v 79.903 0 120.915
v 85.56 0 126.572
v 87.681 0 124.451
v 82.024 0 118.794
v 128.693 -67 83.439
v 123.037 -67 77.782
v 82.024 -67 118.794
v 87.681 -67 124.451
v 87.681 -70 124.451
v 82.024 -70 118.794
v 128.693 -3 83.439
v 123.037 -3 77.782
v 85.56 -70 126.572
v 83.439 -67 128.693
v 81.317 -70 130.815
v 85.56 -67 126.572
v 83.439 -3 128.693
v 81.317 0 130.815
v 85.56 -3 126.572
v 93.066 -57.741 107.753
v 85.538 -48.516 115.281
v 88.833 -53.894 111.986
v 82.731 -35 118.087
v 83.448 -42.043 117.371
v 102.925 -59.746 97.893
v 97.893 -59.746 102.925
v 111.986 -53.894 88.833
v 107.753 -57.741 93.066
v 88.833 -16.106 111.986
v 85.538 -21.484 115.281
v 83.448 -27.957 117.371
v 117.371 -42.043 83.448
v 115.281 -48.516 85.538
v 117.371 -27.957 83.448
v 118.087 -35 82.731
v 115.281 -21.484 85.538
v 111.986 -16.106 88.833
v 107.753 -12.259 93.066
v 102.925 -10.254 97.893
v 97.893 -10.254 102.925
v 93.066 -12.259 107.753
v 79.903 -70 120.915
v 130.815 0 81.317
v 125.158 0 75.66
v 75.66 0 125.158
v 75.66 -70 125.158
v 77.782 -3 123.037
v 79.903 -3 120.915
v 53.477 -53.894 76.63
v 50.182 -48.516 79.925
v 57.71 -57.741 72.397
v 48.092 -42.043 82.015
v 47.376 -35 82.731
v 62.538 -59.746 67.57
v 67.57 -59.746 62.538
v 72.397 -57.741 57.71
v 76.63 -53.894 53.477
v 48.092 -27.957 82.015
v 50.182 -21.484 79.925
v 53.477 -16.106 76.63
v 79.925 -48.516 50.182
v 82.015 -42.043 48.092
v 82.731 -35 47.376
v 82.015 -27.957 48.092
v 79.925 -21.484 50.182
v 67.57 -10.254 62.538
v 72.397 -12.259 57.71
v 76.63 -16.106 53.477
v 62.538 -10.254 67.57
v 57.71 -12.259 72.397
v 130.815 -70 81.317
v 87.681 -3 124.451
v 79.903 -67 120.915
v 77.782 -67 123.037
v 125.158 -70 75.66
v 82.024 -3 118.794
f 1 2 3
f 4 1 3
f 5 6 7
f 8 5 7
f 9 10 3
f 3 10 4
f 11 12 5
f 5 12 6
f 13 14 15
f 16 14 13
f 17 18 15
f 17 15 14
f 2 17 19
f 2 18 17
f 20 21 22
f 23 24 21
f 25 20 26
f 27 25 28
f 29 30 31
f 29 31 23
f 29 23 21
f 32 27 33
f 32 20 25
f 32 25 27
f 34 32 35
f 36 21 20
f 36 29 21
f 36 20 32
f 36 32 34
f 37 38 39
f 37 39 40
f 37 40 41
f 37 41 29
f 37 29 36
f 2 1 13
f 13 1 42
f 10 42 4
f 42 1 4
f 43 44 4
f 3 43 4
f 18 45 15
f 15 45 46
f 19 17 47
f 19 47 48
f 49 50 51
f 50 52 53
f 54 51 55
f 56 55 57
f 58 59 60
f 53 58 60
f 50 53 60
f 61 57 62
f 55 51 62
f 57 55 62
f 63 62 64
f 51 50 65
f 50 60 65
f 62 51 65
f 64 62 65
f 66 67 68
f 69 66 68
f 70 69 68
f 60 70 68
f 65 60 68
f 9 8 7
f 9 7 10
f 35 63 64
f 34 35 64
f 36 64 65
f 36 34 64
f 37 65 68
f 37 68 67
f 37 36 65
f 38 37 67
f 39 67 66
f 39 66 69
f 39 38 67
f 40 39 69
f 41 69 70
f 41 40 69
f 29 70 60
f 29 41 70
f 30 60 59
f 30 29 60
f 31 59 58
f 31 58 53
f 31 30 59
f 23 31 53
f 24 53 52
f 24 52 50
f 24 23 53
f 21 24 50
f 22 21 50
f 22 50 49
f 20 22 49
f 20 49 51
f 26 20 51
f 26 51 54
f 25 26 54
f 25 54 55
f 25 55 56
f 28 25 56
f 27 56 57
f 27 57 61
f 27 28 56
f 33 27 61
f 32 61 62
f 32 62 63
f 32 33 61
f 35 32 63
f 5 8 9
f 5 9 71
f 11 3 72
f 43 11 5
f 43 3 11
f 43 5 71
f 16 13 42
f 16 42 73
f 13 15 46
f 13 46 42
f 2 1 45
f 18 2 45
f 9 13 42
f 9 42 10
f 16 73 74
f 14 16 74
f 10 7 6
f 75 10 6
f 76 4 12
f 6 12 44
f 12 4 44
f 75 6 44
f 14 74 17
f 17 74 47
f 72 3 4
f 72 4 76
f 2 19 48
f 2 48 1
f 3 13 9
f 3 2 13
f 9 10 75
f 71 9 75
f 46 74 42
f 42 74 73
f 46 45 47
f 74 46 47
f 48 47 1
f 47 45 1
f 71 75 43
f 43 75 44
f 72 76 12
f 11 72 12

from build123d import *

# Parameters (mm, degrees)
F15_R     = 25
F16_DEPTH = 50
F15_W     = 3
F15_H     = 64
F15_H_2   = 3
F17_DEPTH = 8
F18_DEPTH = 8


with BuildPart() as f16:
    # F15 (on face) → F16 (new body)
    with BuildSketch(Plane(origin=(100.4091629285, 0, 100.4091629285), x_dir=(0.7071067812, 0, -0.7071067812), z_dir=(0.7071067812, 0, 0.7071067812))):
        with Locations((0, -35)):
            Circle(F15_R)
    extrude(amount=-F16_DEPTH)


with BuildPart() as f17:
    # F15 (on face) → F17 (new body)
    with BuildSketch(Plane(origin=(100.4091629285, 0, 100.4091629285), x_dir=(0.7071067812, 0, -0.7071067812), z_dir=(0.7071067812, 0, 0.7071067812))):
        with Locations((-27.5, -35)):
            Rectangle(F15_W, F15_H)
        with Locations((-27.5, -68.5)):
            Rectangle(F15_W, F15_H_2)
        with Locations((-27.5, -1.5)):
            Rectangle(F15_W, F15_H_2)
    extrude(amount=F17_DEPTH)


with BuildPart() as f18:
    # F15 (on face) → F18 (new body)
    with BuildSketch(Plane(origin=(100.4091629285, 0, 100.4091629285), x_dir=(0.7071067812, 0, -0.7071067812), z_dir=(0.7071067812, 0, 0.7071067812))):
        Polygon((-35, 0), (-35, -70), (-29, -70), (-29, -67), (-32, -67), (-32, -3), (-29, -3), (-29, 0), align=None)
    extrude(amount=F18_DEPTH)


with BuildPart() as f18b:
    # F15 (on face) → F18, piece 2 (new body)
    with BuildSketch(Plane(origin=(100.4091629285, 0, 100.4091629285), x_dir=(0.7071067812, 0, -0.7071067812), z_dir=(0.7071067812, 0, 0.7071067812))):
        Polygon((-26, -67), (-26, -70), (35, -70), (35, 0), (-26, 0), (-26, -3), (0, -3), (32, -3), (32, -67), (0, -67), align=None)
    extrude(amount=F18_DEPTH)


solid = Compound([f16.part, f17.part, f18.part, f18b.part])
